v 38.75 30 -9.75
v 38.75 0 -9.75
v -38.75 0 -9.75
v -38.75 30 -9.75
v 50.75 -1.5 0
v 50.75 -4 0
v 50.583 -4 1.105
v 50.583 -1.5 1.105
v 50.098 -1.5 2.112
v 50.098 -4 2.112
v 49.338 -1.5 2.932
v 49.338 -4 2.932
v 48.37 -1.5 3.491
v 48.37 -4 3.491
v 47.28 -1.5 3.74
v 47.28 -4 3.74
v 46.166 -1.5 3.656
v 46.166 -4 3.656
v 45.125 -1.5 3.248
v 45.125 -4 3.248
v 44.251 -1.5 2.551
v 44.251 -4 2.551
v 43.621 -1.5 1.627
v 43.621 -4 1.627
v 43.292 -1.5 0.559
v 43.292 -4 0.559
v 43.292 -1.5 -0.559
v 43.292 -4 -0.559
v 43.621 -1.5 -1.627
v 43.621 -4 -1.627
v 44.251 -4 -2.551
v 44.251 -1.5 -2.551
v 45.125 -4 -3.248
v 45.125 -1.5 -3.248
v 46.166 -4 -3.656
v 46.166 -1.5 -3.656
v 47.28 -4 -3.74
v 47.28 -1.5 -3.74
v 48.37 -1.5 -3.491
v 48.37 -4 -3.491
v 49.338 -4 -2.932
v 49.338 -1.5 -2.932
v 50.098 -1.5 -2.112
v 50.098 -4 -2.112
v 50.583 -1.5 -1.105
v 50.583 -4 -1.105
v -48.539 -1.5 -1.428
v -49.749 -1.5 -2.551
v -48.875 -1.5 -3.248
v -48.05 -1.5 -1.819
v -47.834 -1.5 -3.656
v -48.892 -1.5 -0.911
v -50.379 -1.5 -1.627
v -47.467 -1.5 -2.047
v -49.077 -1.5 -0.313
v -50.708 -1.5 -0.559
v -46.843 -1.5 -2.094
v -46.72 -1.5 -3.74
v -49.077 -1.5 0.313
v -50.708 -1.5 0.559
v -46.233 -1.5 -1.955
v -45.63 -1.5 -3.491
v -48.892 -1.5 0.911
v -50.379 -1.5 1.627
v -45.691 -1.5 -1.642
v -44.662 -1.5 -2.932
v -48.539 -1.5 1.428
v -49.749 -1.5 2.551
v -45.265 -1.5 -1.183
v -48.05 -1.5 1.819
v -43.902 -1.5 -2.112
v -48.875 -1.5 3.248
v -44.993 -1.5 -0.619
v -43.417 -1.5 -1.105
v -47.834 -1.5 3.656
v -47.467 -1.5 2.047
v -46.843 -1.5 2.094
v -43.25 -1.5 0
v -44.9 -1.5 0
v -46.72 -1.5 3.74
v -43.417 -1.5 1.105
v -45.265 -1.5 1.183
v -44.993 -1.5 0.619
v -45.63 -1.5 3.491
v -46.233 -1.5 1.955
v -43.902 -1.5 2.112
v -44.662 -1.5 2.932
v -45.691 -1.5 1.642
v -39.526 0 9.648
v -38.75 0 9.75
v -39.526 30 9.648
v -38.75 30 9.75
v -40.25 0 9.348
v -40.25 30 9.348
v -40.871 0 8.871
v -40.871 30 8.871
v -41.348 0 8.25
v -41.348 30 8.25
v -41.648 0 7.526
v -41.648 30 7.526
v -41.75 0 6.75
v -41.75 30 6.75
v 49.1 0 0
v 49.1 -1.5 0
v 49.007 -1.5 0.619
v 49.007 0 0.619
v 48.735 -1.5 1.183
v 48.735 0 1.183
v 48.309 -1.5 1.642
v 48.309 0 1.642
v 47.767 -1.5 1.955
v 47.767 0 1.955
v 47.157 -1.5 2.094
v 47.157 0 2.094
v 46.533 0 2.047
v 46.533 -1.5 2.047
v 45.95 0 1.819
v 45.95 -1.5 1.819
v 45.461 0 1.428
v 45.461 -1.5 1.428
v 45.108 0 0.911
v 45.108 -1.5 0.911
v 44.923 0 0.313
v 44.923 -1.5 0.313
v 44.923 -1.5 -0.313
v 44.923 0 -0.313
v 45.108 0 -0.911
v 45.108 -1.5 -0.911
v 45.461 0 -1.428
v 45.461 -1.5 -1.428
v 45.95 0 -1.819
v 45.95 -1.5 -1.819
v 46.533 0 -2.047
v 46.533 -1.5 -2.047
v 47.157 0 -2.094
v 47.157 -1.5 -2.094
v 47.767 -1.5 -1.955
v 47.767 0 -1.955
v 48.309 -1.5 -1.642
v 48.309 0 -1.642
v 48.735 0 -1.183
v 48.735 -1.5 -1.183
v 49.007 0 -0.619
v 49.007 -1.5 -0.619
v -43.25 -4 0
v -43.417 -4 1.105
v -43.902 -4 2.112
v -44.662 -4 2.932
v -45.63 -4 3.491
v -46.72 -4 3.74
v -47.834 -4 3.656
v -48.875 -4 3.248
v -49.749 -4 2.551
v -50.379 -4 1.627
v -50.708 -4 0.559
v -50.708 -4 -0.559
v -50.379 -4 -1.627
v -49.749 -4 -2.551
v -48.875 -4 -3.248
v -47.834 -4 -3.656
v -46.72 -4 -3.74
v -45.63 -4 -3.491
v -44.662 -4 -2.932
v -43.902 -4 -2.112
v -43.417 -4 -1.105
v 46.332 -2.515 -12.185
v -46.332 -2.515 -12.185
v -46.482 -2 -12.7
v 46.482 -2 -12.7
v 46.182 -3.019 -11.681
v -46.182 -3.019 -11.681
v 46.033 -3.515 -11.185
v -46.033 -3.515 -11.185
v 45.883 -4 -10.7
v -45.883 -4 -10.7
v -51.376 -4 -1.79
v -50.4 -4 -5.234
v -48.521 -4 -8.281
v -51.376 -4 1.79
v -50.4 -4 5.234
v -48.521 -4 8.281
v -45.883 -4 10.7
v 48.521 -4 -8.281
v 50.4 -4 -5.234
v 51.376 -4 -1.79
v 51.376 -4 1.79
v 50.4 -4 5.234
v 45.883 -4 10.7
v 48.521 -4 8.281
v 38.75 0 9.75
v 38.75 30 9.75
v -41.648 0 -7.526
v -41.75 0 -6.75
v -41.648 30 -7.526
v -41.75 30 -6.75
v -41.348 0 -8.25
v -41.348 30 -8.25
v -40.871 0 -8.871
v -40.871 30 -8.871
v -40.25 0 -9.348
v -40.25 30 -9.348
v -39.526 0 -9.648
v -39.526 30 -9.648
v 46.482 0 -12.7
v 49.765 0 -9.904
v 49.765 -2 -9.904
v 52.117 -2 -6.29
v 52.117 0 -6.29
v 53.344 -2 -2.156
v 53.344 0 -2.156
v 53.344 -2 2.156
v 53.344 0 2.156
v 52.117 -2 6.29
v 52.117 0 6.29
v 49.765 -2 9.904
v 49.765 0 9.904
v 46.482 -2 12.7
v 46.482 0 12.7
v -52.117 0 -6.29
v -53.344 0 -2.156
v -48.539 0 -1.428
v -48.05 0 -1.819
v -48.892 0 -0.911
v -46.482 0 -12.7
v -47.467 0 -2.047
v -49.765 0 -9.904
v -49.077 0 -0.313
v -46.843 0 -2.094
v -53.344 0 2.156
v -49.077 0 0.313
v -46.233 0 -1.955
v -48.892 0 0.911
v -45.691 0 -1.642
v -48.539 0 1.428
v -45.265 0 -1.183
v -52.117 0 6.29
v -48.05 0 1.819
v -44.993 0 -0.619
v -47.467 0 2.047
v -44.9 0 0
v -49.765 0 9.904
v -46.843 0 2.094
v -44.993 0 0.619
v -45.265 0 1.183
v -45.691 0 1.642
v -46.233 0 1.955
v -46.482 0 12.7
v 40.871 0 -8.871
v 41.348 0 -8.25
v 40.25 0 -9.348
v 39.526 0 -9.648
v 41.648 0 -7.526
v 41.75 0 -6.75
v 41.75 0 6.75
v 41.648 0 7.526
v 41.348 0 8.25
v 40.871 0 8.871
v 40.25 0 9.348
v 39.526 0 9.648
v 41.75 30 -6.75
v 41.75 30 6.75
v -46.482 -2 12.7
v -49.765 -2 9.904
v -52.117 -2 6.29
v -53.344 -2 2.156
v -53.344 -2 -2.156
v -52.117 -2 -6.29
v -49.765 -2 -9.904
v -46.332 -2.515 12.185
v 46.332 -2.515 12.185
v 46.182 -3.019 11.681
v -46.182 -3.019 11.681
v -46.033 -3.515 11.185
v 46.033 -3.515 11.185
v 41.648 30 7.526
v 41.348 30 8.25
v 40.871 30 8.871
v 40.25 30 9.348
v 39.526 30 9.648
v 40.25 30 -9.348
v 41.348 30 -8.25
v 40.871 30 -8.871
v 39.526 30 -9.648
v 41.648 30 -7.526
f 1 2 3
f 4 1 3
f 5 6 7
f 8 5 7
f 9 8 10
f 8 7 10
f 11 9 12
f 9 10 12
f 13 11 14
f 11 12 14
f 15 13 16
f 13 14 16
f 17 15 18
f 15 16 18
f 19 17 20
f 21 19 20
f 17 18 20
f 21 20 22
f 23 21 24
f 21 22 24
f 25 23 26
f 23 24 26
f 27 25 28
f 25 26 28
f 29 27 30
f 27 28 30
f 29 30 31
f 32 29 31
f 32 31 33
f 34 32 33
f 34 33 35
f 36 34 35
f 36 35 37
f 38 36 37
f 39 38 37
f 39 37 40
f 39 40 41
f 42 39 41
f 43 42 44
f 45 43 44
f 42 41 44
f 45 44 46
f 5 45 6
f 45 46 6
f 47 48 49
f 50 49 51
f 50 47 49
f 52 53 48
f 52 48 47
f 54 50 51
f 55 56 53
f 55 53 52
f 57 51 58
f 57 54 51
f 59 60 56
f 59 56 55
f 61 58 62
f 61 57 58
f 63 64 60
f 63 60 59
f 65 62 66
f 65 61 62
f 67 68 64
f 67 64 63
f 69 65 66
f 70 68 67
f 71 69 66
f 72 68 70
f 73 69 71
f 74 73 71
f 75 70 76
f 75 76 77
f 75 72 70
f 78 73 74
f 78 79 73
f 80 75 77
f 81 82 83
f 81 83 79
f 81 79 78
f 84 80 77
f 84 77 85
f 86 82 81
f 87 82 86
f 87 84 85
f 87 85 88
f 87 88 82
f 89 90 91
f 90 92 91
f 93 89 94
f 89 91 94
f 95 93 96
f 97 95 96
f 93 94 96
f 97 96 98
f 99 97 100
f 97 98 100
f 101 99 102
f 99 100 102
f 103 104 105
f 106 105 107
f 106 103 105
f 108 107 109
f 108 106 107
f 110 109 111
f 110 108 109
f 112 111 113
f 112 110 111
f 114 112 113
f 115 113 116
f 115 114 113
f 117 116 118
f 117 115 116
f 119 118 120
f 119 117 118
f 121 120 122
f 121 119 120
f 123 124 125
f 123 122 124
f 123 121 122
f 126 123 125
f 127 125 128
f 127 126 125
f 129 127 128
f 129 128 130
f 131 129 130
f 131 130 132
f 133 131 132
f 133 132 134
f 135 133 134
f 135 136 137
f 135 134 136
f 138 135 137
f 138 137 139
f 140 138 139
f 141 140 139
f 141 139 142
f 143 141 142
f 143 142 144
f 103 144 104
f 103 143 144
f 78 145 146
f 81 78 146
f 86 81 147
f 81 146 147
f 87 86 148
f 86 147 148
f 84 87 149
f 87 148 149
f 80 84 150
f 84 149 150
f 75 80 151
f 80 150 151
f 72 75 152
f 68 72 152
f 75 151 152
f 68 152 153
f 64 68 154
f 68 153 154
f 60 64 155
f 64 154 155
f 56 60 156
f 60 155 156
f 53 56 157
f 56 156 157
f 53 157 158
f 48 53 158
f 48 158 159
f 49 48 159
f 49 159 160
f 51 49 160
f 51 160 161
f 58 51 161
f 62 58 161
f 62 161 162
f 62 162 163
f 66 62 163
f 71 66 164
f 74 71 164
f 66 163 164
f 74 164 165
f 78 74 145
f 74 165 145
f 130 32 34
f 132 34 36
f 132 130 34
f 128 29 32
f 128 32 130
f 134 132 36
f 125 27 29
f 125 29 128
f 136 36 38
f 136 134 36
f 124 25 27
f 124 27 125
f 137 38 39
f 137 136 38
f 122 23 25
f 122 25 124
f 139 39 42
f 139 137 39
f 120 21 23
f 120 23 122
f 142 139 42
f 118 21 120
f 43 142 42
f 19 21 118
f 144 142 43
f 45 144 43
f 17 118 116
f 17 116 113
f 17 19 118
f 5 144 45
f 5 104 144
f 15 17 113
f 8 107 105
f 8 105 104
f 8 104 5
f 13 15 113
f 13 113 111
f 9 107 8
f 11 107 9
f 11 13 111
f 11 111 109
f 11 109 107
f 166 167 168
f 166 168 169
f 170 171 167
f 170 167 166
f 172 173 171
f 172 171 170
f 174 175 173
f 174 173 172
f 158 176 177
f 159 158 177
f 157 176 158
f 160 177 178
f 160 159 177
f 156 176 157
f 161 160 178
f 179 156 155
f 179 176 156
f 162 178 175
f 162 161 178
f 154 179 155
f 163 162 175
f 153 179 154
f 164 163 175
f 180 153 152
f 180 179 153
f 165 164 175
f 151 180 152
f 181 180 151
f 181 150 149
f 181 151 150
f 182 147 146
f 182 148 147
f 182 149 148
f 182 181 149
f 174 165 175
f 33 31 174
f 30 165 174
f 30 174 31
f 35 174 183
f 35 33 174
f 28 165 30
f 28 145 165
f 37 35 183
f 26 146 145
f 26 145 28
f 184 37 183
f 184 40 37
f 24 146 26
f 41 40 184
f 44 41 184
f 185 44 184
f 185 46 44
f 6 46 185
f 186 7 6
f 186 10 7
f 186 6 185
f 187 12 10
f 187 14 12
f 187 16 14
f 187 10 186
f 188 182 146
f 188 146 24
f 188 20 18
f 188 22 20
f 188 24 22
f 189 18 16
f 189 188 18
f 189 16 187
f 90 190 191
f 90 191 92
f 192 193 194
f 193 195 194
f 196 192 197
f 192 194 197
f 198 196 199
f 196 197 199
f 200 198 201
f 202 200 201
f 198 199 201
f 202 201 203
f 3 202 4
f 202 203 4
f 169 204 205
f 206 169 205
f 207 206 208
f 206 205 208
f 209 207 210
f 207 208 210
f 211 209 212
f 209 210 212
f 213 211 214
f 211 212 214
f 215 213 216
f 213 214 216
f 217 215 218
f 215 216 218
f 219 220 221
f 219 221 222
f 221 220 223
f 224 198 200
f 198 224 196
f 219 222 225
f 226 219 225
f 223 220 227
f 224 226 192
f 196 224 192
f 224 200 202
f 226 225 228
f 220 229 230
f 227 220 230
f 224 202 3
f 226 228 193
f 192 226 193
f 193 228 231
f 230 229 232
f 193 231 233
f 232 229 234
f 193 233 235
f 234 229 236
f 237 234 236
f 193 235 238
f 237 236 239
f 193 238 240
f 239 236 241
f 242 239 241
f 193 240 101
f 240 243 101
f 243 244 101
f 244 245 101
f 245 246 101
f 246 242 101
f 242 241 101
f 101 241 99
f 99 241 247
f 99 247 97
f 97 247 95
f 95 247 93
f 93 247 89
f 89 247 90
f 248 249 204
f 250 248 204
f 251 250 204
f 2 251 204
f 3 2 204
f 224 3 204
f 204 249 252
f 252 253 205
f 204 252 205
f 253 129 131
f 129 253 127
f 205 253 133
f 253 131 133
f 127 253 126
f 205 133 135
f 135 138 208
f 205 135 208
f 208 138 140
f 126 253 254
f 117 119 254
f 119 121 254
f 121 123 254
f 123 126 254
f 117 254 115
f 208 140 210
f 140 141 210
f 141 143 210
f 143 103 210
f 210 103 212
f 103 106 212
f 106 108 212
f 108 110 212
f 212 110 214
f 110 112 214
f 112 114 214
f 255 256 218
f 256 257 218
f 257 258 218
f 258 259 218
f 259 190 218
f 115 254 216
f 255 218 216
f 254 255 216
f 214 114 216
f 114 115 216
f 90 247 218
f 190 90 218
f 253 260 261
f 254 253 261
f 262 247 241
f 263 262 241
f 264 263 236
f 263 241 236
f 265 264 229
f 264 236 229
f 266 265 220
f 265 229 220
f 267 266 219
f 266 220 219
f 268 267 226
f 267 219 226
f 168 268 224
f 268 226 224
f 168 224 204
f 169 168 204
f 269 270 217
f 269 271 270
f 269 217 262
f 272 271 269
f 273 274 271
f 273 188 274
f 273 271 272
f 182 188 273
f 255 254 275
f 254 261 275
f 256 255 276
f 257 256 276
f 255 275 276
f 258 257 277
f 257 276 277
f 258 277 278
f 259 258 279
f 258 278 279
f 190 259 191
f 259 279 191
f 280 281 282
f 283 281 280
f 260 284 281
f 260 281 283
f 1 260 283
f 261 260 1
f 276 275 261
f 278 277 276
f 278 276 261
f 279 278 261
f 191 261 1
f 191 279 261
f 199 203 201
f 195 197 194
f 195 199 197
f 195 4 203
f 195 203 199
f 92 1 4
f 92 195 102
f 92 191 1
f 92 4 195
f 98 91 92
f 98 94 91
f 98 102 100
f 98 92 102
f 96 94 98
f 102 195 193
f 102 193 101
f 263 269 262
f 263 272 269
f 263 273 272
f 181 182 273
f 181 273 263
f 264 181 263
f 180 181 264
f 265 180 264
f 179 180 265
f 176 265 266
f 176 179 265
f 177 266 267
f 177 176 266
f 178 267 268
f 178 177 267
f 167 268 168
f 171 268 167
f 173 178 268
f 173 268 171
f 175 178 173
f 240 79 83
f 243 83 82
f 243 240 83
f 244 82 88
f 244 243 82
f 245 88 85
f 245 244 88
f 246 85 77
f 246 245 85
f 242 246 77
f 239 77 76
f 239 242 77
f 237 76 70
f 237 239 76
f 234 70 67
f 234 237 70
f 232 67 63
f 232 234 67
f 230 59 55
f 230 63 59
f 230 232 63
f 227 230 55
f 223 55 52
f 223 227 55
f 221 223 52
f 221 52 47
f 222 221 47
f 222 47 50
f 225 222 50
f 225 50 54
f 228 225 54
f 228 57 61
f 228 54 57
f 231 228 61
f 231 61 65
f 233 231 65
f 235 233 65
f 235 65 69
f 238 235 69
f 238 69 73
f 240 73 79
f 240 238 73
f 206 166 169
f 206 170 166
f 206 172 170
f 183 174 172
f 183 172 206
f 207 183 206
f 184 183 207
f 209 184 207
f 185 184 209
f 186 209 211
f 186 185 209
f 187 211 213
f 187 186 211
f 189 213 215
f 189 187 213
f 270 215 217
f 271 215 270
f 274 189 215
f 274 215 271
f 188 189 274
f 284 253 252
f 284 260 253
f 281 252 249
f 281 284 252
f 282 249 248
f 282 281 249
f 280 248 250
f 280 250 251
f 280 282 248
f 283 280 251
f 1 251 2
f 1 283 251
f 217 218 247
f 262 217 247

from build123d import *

# Parameters (mm, degrees)
F0_R     = 2.1
F1_DEPTH = 4
F2_SIZE  = 2
F3_R     = 3.75
F4_DEPTH = 2.5
F5_W     = 83.5
F5_H     = 19.5
F6_DEPTH = 30
F7_R     = 3


with BuildPart() as f1:
    # F0 (on Front) → F1 (new body)
    with BuildSketch(Plane.XZ):
        with BuildLine():
            Line((0, 12.7), (-46.481854, 12.7))
            ThreePointArc((-46.481854, 12.7), (-53.5, 0), (-46.481854, -12.7))
            Line((-46.481854, -12.7), (0, -12.7))
            Line((0, -12.7), (46.481854, -12.7))
            ThreePointArc((46.481854, -12.7), (53.5, 0), (46.481854, 12.7))
            Line((46.481854, 12.7), (0, 12.7))
        make_face()
        with Locations((-47, 0)):
            Circle(F0_R, mode=Mode.SUBTRACT)
        with Locations((47, 0)):
            Circle(F0_R, mode=Mode.SUBTRACT)
    extrude(amount=F1_DEPTH)

    # F2
    f2_edges = [f1.edges().sort_by_distance(p)[0] for p in [
        (0, -4, 12.7),
        (53.5, -4, 0),
        (0, -4, -12.7),
        (-53.5, -4, 0),
    ]]
    chamfer(f2_edges, length=F2_SIZE)

    # F3 (on face) → F4 (cut)
    with BuildSketch(Plane.XZ.offset(4)):
        with Locations((-47, 0)):
            Circle(F3_R)
        with Locations((47, 0)):
            Circle(F3_R)
    extrude(amount=-F4_DEPTH, mode=Mode.SUBTRACT)

    # F5 (on face) → F6 (join)
    with BuildSketch(Plane(origin=(0, 0, 0), x_dir=(-1, 0, 0), z_dir=(0, 1, 0))):
        Rectangle(F5_W, F5_H)
    extrude(amount=F6_DEPTH)

    # F7
    f7_edges = [f1.edges().sort_by_distance(p)[0] for p in [
        (41.75, 15, 9.75),
        (-41.75, 15, 9.75),
        (-41.75, 15, -9.75),
        (41.75, 15, -9.75),
    ]]
    fillet(f7_edges, radius=F7_R)


solid = f1.part
